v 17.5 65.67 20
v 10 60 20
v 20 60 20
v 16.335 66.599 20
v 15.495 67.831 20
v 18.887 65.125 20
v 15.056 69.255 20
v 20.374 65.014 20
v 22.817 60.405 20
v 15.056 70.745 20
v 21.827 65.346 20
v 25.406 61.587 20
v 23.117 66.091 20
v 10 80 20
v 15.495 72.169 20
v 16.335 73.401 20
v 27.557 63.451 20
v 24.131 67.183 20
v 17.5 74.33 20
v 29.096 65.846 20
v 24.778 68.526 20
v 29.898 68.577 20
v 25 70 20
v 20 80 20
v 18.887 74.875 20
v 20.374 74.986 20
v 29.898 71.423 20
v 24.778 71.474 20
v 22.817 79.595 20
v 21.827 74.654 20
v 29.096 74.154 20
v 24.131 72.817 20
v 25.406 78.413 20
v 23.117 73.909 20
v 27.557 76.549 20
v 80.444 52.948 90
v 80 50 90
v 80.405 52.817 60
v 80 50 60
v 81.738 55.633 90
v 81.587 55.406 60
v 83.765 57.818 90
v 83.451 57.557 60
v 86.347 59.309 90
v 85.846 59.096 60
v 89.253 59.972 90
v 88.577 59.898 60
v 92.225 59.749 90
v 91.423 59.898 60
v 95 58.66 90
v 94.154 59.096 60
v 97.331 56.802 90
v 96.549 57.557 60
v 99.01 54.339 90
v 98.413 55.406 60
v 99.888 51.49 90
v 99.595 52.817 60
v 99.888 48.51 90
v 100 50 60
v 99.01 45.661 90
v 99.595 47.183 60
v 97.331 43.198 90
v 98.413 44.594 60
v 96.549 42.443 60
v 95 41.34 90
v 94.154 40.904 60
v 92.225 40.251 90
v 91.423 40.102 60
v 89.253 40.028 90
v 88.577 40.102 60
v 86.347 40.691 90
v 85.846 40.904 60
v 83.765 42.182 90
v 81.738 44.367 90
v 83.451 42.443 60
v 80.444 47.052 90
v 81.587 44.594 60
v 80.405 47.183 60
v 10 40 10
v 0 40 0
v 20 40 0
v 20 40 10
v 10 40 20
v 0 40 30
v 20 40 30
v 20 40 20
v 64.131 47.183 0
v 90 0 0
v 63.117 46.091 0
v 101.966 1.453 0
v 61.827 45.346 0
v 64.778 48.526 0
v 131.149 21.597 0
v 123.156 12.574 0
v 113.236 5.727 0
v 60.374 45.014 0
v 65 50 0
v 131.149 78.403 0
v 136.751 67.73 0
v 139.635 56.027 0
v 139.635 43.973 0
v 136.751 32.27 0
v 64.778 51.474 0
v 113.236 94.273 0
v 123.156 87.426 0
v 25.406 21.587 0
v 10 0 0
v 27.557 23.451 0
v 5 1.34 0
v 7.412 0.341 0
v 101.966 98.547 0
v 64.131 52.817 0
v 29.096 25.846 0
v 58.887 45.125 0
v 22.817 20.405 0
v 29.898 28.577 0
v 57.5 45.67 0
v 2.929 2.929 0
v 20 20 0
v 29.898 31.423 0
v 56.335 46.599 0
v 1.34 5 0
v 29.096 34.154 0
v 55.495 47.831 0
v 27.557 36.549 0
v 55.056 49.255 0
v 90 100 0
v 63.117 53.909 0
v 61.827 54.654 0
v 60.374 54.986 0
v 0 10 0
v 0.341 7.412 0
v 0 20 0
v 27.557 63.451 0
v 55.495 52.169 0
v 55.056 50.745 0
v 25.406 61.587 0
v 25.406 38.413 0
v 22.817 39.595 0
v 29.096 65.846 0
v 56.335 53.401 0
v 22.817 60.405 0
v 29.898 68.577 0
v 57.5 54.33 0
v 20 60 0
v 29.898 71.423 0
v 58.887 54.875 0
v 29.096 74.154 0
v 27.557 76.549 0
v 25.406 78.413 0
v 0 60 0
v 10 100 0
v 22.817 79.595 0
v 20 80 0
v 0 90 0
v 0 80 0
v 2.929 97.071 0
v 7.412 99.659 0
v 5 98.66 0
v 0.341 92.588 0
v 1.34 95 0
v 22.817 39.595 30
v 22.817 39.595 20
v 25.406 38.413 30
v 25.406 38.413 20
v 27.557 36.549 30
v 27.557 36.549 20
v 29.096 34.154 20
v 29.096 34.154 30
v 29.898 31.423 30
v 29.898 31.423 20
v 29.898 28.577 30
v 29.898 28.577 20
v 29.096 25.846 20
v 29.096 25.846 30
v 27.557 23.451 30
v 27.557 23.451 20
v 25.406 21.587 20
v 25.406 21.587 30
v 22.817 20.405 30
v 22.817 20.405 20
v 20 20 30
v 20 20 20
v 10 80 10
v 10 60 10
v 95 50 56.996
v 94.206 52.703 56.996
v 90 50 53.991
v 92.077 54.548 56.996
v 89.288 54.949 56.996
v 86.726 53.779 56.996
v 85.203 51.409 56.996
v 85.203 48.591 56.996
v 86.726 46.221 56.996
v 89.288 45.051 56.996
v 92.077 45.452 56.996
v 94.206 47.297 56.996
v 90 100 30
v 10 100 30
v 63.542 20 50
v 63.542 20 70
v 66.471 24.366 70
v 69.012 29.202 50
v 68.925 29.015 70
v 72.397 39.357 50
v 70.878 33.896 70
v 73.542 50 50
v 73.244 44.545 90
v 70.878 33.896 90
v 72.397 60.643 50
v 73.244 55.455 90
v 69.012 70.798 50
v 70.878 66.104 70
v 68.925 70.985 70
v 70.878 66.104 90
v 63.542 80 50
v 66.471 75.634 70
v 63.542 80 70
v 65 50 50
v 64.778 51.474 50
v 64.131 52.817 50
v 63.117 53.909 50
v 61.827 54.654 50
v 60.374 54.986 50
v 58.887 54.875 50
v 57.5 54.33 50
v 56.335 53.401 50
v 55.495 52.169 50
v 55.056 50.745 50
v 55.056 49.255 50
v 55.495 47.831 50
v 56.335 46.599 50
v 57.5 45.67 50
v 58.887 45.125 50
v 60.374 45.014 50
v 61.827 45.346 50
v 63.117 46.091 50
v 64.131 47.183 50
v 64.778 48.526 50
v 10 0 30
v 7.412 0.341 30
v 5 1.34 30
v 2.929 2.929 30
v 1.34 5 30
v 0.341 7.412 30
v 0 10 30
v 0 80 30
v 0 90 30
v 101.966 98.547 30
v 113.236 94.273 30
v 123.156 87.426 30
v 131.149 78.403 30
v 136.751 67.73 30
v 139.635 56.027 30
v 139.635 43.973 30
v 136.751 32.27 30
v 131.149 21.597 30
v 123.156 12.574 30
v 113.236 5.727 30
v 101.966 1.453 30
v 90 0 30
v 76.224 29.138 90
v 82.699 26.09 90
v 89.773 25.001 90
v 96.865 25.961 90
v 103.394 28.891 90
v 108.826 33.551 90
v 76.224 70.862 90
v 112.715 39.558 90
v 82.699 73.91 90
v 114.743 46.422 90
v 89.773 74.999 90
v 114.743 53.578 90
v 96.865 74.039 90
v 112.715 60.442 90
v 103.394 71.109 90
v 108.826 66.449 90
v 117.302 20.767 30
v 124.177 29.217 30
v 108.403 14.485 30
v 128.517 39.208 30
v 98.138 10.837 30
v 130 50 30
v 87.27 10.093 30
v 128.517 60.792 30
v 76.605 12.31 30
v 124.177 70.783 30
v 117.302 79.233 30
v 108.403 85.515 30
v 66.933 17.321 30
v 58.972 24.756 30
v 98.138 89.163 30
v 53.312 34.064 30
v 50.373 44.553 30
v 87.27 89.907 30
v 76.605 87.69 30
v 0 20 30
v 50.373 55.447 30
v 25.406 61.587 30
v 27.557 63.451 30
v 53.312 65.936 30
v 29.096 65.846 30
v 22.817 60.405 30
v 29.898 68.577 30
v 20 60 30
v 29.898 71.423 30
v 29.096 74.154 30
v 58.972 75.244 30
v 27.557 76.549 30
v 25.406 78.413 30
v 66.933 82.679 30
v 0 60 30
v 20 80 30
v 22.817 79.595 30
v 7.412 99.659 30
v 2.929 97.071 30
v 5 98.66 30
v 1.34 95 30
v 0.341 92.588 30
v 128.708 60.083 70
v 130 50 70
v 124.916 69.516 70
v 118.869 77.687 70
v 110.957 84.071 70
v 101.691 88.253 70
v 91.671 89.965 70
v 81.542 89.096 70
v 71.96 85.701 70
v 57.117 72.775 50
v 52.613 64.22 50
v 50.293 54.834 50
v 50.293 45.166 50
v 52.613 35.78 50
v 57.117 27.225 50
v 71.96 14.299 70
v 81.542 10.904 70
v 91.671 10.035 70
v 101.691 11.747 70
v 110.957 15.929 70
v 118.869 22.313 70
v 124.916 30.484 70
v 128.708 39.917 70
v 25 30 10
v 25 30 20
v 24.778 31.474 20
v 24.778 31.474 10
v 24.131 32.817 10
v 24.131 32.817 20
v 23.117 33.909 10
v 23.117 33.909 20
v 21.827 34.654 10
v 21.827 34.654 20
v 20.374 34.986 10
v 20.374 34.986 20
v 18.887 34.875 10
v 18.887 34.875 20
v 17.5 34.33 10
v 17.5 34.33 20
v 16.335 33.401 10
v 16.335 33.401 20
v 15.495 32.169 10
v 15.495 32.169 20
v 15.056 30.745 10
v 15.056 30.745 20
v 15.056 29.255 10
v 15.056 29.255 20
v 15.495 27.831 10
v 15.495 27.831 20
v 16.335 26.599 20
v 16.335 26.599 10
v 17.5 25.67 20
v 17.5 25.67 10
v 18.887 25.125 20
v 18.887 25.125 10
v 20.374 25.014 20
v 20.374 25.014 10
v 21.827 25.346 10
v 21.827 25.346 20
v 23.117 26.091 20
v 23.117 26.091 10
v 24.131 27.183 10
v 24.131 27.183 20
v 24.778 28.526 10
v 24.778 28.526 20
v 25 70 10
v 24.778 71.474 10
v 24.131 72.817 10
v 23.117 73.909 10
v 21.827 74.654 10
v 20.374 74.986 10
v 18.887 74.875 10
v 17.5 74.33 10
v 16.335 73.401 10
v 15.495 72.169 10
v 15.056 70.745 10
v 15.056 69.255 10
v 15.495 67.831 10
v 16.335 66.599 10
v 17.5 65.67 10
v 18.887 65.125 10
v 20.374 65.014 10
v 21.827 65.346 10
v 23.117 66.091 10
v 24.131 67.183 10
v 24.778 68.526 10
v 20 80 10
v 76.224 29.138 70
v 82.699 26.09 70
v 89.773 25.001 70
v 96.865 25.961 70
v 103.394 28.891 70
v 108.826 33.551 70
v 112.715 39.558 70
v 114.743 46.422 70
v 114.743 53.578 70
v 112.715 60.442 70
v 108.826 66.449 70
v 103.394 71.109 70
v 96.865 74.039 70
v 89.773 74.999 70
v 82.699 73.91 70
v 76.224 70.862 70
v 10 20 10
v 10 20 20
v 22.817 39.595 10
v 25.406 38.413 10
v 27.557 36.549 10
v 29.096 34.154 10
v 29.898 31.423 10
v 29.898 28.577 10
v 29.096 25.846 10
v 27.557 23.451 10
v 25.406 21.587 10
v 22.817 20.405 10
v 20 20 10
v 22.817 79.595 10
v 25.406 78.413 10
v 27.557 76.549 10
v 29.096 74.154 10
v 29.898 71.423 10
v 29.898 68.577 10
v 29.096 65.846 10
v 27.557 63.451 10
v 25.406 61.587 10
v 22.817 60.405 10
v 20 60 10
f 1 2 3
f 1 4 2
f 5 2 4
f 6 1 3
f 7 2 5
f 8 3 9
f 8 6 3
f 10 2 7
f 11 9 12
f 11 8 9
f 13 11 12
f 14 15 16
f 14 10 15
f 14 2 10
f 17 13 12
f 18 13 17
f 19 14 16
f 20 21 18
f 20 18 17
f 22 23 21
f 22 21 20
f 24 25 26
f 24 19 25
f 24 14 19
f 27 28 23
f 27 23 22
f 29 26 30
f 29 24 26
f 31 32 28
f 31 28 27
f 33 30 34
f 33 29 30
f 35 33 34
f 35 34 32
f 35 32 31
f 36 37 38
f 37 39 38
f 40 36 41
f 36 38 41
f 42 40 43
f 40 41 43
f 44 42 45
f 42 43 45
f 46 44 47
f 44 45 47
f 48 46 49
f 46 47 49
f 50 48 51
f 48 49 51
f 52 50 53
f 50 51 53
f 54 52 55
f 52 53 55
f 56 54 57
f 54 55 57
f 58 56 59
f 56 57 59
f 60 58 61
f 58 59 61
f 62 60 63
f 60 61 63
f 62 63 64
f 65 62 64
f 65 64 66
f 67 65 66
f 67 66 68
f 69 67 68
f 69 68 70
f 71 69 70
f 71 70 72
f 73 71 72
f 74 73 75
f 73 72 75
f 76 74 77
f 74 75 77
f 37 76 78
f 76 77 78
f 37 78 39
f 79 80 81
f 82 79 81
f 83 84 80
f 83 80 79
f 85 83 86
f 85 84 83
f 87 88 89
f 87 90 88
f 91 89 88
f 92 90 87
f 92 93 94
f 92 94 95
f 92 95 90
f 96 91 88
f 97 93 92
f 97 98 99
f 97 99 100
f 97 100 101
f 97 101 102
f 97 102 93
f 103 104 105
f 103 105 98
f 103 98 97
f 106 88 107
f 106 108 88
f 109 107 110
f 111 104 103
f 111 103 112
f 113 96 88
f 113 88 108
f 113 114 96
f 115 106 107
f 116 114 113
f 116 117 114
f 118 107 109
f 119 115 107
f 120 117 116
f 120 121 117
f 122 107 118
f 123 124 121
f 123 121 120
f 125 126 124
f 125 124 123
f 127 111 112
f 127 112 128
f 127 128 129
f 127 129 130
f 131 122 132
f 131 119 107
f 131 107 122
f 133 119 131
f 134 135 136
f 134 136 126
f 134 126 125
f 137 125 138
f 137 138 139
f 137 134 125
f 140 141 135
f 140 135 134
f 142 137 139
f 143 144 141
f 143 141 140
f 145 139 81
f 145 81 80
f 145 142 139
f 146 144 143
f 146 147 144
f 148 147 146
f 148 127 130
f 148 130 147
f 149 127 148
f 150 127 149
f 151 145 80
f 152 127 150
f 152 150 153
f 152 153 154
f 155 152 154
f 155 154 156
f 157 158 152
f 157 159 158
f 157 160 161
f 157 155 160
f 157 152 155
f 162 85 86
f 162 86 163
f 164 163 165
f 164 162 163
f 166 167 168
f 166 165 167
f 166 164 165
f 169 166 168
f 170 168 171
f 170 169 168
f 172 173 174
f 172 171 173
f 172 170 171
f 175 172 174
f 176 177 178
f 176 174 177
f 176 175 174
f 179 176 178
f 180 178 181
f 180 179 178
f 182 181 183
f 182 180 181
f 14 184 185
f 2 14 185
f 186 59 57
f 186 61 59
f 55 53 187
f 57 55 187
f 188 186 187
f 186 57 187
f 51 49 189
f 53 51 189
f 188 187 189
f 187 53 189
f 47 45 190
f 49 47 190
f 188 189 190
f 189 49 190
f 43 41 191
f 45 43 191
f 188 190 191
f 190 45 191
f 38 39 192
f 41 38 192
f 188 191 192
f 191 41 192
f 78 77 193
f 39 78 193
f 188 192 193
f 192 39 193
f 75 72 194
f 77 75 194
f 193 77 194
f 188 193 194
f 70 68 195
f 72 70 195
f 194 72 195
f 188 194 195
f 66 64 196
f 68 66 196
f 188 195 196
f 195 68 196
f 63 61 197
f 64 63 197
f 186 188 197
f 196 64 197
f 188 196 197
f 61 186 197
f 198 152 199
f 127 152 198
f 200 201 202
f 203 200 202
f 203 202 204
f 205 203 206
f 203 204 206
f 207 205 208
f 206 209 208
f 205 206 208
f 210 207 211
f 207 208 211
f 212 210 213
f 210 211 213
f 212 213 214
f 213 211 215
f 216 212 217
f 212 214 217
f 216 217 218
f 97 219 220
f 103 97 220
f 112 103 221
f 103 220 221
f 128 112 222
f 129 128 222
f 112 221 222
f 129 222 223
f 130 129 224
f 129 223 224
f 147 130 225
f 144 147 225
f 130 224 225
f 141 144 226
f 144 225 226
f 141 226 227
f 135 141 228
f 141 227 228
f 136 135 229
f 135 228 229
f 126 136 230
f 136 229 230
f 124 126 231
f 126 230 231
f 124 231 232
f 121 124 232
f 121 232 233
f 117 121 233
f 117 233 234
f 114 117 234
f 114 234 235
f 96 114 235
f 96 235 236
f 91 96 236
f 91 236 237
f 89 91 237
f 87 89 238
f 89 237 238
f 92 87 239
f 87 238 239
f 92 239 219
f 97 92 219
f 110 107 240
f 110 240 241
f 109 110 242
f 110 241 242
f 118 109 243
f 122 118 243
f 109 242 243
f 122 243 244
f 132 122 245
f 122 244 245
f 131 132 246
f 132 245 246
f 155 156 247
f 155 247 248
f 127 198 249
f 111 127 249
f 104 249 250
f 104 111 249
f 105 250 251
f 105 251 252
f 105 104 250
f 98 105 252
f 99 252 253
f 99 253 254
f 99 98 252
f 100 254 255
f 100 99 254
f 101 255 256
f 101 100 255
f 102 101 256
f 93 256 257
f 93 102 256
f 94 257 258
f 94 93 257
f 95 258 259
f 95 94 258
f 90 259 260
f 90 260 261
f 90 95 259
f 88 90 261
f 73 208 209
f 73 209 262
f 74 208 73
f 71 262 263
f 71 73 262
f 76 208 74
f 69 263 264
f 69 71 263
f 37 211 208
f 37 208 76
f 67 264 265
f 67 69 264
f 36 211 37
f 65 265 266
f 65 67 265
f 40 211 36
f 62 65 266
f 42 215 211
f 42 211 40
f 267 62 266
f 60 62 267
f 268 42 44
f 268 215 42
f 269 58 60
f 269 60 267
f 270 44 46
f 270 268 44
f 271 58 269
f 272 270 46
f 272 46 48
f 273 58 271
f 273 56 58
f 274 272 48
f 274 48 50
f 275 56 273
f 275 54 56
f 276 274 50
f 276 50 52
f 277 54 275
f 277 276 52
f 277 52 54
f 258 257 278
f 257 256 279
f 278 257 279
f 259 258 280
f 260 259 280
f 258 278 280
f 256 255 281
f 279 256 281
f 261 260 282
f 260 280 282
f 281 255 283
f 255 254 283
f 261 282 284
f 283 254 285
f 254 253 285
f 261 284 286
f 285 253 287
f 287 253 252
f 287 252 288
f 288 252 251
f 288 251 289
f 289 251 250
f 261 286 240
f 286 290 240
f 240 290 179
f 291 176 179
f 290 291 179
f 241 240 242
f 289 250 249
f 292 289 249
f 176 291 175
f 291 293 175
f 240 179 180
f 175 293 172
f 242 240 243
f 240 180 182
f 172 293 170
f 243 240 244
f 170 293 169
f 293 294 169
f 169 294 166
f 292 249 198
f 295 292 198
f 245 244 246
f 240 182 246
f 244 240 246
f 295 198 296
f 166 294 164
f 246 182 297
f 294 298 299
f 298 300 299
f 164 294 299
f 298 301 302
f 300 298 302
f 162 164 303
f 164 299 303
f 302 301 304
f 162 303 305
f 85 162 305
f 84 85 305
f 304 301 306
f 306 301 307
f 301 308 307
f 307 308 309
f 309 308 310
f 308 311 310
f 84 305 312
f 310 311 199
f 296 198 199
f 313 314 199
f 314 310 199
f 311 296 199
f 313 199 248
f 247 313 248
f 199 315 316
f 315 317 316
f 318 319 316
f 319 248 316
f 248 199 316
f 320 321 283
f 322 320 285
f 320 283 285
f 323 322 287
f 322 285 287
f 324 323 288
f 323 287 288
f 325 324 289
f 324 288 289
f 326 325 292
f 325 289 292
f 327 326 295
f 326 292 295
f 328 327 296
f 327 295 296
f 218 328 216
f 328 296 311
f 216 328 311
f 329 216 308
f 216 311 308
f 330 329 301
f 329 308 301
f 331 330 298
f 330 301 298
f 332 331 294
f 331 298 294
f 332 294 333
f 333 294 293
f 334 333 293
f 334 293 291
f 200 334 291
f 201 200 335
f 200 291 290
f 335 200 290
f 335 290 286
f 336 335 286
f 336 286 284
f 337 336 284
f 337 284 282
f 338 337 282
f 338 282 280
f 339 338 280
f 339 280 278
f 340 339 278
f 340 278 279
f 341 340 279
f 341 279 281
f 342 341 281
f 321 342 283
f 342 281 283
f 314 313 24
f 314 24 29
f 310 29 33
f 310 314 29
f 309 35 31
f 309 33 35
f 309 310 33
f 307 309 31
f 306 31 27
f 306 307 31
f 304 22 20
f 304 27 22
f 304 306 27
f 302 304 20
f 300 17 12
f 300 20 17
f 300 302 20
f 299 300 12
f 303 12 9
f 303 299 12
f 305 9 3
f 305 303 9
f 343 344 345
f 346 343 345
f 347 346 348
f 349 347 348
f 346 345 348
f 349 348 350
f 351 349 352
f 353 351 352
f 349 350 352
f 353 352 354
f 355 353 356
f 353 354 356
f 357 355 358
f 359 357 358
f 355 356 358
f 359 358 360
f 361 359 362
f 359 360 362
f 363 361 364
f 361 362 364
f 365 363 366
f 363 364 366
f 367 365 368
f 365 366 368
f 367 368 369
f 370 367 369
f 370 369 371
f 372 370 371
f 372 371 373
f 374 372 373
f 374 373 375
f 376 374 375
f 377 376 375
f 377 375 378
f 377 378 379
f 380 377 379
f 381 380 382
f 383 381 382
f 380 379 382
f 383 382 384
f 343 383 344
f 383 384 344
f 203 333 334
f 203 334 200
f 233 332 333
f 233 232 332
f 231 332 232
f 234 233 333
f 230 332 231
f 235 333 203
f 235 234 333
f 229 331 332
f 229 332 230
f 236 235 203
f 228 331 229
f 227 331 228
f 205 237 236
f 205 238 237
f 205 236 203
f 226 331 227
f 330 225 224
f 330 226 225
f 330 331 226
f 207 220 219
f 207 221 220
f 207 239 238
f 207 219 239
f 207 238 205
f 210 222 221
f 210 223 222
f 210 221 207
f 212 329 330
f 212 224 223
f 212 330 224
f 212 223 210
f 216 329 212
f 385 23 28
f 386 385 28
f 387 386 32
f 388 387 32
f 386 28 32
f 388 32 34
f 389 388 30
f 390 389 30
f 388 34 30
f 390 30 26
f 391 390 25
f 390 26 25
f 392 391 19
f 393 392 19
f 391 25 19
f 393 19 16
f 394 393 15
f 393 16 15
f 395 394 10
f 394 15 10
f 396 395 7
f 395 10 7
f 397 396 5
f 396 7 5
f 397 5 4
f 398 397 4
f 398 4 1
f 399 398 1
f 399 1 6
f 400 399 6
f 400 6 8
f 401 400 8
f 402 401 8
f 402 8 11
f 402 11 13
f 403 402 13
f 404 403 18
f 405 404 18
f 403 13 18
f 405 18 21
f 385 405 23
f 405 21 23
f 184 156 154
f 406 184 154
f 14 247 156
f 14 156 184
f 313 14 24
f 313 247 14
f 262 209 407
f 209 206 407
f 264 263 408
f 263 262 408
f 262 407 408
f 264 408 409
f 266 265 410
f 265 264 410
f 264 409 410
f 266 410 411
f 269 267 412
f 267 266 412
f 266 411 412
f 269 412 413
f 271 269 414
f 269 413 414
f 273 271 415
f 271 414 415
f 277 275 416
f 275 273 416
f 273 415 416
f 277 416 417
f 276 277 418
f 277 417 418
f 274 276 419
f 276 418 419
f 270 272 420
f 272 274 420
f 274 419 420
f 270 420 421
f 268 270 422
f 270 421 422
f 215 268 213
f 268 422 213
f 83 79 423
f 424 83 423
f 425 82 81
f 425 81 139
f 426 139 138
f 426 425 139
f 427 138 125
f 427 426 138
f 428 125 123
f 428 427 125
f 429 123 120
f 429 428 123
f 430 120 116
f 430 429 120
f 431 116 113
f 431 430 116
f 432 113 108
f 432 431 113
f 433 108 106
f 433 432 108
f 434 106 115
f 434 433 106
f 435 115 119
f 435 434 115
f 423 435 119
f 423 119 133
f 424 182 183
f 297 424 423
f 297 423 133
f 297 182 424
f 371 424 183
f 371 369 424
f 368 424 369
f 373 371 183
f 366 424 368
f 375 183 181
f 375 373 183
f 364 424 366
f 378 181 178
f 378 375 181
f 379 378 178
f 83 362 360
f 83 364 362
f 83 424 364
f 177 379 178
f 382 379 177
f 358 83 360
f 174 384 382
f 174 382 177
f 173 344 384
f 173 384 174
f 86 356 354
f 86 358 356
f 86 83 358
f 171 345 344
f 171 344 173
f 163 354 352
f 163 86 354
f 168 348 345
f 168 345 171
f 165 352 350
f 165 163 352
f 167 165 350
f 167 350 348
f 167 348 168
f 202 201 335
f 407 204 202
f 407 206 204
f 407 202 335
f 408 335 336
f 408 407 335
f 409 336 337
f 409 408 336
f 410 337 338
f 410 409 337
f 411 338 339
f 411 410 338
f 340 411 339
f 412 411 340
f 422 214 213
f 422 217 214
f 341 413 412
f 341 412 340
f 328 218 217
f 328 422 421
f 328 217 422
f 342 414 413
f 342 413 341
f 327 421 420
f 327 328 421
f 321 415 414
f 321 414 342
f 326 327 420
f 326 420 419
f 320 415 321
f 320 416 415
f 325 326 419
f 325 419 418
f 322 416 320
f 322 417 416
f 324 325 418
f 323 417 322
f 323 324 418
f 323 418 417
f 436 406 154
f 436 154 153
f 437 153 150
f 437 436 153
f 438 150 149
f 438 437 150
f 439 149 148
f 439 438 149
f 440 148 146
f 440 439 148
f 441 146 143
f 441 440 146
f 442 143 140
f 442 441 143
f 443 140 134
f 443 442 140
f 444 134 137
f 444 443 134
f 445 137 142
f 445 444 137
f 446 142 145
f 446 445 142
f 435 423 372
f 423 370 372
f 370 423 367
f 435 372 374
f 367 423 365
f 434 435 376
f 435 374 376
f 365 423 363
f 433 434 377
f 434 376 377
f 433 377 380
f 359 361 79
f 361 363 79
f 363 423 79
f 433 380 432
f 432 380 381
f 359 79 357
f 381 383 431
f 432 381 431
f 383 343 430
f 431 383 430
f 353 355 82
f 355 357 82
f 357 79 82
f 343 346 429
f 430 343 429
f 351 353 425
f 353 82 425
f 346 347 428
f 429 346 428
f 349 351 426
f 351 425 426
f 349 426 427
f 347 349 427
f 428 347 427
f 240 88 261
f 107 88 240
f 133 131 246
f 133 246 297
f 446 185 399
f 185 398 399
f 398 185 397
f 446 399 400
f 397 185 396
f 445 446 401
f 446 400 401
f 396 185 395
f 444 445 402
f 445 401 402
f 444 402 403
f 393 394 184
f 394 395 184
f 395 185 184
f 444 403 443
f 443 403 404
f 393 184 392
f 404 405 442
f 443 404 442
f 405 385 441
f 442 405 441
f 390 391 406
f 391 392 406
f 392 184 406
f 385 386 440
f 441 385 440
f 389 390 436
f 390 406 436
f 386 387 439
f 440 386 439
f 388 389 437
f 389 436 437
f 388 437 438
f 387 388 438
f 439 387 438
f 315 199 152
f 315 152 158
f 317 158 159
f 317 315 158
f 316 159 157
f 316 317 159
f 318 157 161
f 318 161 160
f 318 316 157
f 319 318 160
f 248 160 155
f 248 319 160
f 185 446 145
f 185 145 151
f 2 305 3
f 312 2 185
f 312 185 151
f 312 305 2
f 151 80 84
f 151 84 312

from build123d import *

# Parameters (mm, degrees)
BOSS_EXTRUDE1_DEPTH        = 30
SKETCH2_W                  = 10
SKETCH2_H                  = 20
CUT_EXTRUDE1_DEPTH         = 30
SKETCH3_R                  = 40
BOSS_EXTRUDE2_DEPTH        = 40
SKETCH4_R                  = 25
BOSS_EXTRUDE3_DEPTH        = 20
CUT_EXTRUDE2_DEPTH         = 42
CUT_EXTRUDE3_DEPTH         = 42
BOSS_EXTRUDE4_START        = 10
BOSS_EXTRUDE4_DEPTH        = 10
BOSS_EXTRUDE5_START        = 10
BOSS_EXTRUDE5_DEPTH        = 10
SKETCH9_R                  = 5
CUT_EXTRUDE4_DEPTH         = 10
CUT_EXTRUDE5_DEPTH         = 20
CUT_EXTRUDE5_DEPTH_BACK    = 20
SKETCH11_R                 = 5
CUT_EXTRUDE6_DEPTH         = 50
F_20_0MM_DOWEL_HOLE1_D     = 20
F_20_0MM_DOWEL_HOLE1_DEPTH = 30
F_20_0MM_DOWEL_HOLE1_TIP   = 6.00860619


with BuildPart() as part:
    # Sketch1 → Boss-Extrude1 (new body)
    with BuildSketch(Plane.XY):
        with BuildLine():
            Line((0, 100), (0, 0))
            Line((0, 0), (90, 0))
            ThreePointArc((90, 0), (140, 50), (90, 100))
            Line((90, 100), (0, 100))
        make_face()
    extrude(amount=BOSS_EXTRUDE1_DEPTH)

    # Sketch2 → Cut-Extrude1 (cut)
    with BuildSketch(Plane.XY.offset(30)):
        with BuildLine():
            Line((0, 90), (0, 100))
            Line((0, 100), (10, 100))
            ThreePointArc((10, 100), (2.928932188, 97.071067812), (0, 90))
        make_face()
        with BuildLine():
            Line((0, 10), (0, 0))
            Line((0, 0), (10, 0))
            ThreePointArc((10, 0), (2.928932188, 2.928932188), (0, 10))
        make_face()
        with Locations((5, 70)):
            Rectangle(SKETCH2_W, SKETCH2_H)
        with Locations((5, 30)):
            Rectangle(SKETCH2_W, SKETCH2_H)
    extrude(amount=-CUT_EXTRUDE1_DEPTH, mode=Mode.SUBTRACT)

    # Sketch3 → Boss-Extrude2 (add)
    with BuildSketch(Plane.XY.offset(30)):
        with Locations((90, 50)):
            Circle(SKETCH3_R)
    extrude(amount=BOSS_EXTRUDE2_DEPTH)

    # Sketch4 → Boss-Extrude3 (add)
    with BuildSketch(Plane.XY.offset(70)):
        with Locations((90, 50)):
            Circle(SKETCH4_R)
    extrude(amount=BOSS_EXTRUDE3_DEPTH)

    # Sketch5 → Cut-Extrude2 (cut)
    with BuildSketch(Plane.XY.offset(30)):
        with BuildLine():
            Line((20, 80), (10, 80))
            Line((10, 80), (10, 60))
            Line((10, 60), (20, 60))
            ThreePointArc((20, 60), (30, 70), (20, 80))
        make_face()
    extrude(amount=-CUT_EXTRUDE2_DEPTH, mode=Mode.SUBTRACT)

    # Sketch6 → Cut-Extrude3 (cut)
    with BuildSketch(Plane.XY.offset(30)):
        with BuildLine():
            Line((20, 40), (10, 40))
            Line((10, 40), (10, 20))
            Line((10, 20), (20, 20))
            ThreePointArc((20, 20), (30, 30), (20, 40))
        make_face()
    extrude(amount=-CUT_EXTRUDE3_DEPTH, mode=Mode.SUBTRACT)

    # Sketch7 → Boss-Extrude4 (add)
    with BuildSketch(Plane.XY.offset(10).offset(BOSS_EXTRUDE4_START)):
        with BuildLine():
            Line((10, 80), (10, 60))
            Line((10, 60), (20, 60))
            ThreePointArc((20, 60), (30, 70), (20, 80))
            Line((20, 80), (10, 80))
        make_face()
    extrude(amount=-BOSS_EXTRUDE4_DEPTH)

    # Sketch8 → Boss-Extrude5 (add)
    with BuildSketch(Plane.XY.offset(10).offset(BOSS_EXTRUDE5_START)):
        with BuildLine():
            Line((10, 40), (10, 20))
            Line((10, 20), (20, 20))
            ThreePointArc((20, 20), (30, 30), (20, 40))
            Line((20, 40), (10, 40))
        make_face()
    extrude(amount=-BOSS_EXTRUDE5_DEPTH)

    # Sketch9 → Cut-Extrude4 (cut)
    with BuildSketch(Plane.XY.offset(20)):
        with Locations((20, 70)):
            Circle(SKETCH9_R)
        with Locations((20, 30)):
            Circle(SKETCH9_R)
    extrude(amount=-CUT_EXTRUDE4_DEPTH, mode=Mode.SUBTRACT)

    # Sketch10 → Cut-Extrude5 (cut, two sides: drawn at the far end of the back side and taken through both)
    with BuildSketch(Plane.XY.offset(70).offset(-CUT_EXTRUDE5_DEPTH_BACK)):
        with BuildLine():
            ThreePointArc((63.542486889, 80), (50, 50), (63.542486889, 20))
            ThreePointArc((63.542486889, 20), (73.542486889, 50), (63.542486889, 80))
        make_face()
    extrude(amount=CUT_EXTRUDE5_DEPTH + CUT_EXTRUDE5_DEPTH_BACK, mode=Mode.SUBTRACT)

    # Sketch11 → Cut-Extrude6 (cut)
    with BuildSketch(Plane.XY.offset(50)):
        with Locations((60, 50)):
            Circle(SKETCH11_R)
    extrude(amount=-CUT_EXTRUDE6_DEPTH, mode=Mode.SUBTRACT)

    # Ø20.0mm Dowel Hole1
    with Locations(Plane(origin=(90, 50, 90), x_dir=(1, 0, 0), z_dir=(0, 0, 1))):
        with Locations((0, 0)):
            Hole(F_20_0MM_DOWEL_HOLE1_D / 2, depth=F_20_0MM_DOWEL_HOLE1_DEPTH)
            with Locations((0, 0, -(F_20_0MM_DOWEL_HOLE1_DEPTH + F_20_0MM_DOWEL_HOLE1_TIP / 2))):  # 118° drill point
                Cone(0, F_20_0MM_DOWEL_HOLE1_D / 2, F_20_0MM_DOWEL_HOLE1_TIP, mode=Mode.SUBTRACT)


solid = part.part
